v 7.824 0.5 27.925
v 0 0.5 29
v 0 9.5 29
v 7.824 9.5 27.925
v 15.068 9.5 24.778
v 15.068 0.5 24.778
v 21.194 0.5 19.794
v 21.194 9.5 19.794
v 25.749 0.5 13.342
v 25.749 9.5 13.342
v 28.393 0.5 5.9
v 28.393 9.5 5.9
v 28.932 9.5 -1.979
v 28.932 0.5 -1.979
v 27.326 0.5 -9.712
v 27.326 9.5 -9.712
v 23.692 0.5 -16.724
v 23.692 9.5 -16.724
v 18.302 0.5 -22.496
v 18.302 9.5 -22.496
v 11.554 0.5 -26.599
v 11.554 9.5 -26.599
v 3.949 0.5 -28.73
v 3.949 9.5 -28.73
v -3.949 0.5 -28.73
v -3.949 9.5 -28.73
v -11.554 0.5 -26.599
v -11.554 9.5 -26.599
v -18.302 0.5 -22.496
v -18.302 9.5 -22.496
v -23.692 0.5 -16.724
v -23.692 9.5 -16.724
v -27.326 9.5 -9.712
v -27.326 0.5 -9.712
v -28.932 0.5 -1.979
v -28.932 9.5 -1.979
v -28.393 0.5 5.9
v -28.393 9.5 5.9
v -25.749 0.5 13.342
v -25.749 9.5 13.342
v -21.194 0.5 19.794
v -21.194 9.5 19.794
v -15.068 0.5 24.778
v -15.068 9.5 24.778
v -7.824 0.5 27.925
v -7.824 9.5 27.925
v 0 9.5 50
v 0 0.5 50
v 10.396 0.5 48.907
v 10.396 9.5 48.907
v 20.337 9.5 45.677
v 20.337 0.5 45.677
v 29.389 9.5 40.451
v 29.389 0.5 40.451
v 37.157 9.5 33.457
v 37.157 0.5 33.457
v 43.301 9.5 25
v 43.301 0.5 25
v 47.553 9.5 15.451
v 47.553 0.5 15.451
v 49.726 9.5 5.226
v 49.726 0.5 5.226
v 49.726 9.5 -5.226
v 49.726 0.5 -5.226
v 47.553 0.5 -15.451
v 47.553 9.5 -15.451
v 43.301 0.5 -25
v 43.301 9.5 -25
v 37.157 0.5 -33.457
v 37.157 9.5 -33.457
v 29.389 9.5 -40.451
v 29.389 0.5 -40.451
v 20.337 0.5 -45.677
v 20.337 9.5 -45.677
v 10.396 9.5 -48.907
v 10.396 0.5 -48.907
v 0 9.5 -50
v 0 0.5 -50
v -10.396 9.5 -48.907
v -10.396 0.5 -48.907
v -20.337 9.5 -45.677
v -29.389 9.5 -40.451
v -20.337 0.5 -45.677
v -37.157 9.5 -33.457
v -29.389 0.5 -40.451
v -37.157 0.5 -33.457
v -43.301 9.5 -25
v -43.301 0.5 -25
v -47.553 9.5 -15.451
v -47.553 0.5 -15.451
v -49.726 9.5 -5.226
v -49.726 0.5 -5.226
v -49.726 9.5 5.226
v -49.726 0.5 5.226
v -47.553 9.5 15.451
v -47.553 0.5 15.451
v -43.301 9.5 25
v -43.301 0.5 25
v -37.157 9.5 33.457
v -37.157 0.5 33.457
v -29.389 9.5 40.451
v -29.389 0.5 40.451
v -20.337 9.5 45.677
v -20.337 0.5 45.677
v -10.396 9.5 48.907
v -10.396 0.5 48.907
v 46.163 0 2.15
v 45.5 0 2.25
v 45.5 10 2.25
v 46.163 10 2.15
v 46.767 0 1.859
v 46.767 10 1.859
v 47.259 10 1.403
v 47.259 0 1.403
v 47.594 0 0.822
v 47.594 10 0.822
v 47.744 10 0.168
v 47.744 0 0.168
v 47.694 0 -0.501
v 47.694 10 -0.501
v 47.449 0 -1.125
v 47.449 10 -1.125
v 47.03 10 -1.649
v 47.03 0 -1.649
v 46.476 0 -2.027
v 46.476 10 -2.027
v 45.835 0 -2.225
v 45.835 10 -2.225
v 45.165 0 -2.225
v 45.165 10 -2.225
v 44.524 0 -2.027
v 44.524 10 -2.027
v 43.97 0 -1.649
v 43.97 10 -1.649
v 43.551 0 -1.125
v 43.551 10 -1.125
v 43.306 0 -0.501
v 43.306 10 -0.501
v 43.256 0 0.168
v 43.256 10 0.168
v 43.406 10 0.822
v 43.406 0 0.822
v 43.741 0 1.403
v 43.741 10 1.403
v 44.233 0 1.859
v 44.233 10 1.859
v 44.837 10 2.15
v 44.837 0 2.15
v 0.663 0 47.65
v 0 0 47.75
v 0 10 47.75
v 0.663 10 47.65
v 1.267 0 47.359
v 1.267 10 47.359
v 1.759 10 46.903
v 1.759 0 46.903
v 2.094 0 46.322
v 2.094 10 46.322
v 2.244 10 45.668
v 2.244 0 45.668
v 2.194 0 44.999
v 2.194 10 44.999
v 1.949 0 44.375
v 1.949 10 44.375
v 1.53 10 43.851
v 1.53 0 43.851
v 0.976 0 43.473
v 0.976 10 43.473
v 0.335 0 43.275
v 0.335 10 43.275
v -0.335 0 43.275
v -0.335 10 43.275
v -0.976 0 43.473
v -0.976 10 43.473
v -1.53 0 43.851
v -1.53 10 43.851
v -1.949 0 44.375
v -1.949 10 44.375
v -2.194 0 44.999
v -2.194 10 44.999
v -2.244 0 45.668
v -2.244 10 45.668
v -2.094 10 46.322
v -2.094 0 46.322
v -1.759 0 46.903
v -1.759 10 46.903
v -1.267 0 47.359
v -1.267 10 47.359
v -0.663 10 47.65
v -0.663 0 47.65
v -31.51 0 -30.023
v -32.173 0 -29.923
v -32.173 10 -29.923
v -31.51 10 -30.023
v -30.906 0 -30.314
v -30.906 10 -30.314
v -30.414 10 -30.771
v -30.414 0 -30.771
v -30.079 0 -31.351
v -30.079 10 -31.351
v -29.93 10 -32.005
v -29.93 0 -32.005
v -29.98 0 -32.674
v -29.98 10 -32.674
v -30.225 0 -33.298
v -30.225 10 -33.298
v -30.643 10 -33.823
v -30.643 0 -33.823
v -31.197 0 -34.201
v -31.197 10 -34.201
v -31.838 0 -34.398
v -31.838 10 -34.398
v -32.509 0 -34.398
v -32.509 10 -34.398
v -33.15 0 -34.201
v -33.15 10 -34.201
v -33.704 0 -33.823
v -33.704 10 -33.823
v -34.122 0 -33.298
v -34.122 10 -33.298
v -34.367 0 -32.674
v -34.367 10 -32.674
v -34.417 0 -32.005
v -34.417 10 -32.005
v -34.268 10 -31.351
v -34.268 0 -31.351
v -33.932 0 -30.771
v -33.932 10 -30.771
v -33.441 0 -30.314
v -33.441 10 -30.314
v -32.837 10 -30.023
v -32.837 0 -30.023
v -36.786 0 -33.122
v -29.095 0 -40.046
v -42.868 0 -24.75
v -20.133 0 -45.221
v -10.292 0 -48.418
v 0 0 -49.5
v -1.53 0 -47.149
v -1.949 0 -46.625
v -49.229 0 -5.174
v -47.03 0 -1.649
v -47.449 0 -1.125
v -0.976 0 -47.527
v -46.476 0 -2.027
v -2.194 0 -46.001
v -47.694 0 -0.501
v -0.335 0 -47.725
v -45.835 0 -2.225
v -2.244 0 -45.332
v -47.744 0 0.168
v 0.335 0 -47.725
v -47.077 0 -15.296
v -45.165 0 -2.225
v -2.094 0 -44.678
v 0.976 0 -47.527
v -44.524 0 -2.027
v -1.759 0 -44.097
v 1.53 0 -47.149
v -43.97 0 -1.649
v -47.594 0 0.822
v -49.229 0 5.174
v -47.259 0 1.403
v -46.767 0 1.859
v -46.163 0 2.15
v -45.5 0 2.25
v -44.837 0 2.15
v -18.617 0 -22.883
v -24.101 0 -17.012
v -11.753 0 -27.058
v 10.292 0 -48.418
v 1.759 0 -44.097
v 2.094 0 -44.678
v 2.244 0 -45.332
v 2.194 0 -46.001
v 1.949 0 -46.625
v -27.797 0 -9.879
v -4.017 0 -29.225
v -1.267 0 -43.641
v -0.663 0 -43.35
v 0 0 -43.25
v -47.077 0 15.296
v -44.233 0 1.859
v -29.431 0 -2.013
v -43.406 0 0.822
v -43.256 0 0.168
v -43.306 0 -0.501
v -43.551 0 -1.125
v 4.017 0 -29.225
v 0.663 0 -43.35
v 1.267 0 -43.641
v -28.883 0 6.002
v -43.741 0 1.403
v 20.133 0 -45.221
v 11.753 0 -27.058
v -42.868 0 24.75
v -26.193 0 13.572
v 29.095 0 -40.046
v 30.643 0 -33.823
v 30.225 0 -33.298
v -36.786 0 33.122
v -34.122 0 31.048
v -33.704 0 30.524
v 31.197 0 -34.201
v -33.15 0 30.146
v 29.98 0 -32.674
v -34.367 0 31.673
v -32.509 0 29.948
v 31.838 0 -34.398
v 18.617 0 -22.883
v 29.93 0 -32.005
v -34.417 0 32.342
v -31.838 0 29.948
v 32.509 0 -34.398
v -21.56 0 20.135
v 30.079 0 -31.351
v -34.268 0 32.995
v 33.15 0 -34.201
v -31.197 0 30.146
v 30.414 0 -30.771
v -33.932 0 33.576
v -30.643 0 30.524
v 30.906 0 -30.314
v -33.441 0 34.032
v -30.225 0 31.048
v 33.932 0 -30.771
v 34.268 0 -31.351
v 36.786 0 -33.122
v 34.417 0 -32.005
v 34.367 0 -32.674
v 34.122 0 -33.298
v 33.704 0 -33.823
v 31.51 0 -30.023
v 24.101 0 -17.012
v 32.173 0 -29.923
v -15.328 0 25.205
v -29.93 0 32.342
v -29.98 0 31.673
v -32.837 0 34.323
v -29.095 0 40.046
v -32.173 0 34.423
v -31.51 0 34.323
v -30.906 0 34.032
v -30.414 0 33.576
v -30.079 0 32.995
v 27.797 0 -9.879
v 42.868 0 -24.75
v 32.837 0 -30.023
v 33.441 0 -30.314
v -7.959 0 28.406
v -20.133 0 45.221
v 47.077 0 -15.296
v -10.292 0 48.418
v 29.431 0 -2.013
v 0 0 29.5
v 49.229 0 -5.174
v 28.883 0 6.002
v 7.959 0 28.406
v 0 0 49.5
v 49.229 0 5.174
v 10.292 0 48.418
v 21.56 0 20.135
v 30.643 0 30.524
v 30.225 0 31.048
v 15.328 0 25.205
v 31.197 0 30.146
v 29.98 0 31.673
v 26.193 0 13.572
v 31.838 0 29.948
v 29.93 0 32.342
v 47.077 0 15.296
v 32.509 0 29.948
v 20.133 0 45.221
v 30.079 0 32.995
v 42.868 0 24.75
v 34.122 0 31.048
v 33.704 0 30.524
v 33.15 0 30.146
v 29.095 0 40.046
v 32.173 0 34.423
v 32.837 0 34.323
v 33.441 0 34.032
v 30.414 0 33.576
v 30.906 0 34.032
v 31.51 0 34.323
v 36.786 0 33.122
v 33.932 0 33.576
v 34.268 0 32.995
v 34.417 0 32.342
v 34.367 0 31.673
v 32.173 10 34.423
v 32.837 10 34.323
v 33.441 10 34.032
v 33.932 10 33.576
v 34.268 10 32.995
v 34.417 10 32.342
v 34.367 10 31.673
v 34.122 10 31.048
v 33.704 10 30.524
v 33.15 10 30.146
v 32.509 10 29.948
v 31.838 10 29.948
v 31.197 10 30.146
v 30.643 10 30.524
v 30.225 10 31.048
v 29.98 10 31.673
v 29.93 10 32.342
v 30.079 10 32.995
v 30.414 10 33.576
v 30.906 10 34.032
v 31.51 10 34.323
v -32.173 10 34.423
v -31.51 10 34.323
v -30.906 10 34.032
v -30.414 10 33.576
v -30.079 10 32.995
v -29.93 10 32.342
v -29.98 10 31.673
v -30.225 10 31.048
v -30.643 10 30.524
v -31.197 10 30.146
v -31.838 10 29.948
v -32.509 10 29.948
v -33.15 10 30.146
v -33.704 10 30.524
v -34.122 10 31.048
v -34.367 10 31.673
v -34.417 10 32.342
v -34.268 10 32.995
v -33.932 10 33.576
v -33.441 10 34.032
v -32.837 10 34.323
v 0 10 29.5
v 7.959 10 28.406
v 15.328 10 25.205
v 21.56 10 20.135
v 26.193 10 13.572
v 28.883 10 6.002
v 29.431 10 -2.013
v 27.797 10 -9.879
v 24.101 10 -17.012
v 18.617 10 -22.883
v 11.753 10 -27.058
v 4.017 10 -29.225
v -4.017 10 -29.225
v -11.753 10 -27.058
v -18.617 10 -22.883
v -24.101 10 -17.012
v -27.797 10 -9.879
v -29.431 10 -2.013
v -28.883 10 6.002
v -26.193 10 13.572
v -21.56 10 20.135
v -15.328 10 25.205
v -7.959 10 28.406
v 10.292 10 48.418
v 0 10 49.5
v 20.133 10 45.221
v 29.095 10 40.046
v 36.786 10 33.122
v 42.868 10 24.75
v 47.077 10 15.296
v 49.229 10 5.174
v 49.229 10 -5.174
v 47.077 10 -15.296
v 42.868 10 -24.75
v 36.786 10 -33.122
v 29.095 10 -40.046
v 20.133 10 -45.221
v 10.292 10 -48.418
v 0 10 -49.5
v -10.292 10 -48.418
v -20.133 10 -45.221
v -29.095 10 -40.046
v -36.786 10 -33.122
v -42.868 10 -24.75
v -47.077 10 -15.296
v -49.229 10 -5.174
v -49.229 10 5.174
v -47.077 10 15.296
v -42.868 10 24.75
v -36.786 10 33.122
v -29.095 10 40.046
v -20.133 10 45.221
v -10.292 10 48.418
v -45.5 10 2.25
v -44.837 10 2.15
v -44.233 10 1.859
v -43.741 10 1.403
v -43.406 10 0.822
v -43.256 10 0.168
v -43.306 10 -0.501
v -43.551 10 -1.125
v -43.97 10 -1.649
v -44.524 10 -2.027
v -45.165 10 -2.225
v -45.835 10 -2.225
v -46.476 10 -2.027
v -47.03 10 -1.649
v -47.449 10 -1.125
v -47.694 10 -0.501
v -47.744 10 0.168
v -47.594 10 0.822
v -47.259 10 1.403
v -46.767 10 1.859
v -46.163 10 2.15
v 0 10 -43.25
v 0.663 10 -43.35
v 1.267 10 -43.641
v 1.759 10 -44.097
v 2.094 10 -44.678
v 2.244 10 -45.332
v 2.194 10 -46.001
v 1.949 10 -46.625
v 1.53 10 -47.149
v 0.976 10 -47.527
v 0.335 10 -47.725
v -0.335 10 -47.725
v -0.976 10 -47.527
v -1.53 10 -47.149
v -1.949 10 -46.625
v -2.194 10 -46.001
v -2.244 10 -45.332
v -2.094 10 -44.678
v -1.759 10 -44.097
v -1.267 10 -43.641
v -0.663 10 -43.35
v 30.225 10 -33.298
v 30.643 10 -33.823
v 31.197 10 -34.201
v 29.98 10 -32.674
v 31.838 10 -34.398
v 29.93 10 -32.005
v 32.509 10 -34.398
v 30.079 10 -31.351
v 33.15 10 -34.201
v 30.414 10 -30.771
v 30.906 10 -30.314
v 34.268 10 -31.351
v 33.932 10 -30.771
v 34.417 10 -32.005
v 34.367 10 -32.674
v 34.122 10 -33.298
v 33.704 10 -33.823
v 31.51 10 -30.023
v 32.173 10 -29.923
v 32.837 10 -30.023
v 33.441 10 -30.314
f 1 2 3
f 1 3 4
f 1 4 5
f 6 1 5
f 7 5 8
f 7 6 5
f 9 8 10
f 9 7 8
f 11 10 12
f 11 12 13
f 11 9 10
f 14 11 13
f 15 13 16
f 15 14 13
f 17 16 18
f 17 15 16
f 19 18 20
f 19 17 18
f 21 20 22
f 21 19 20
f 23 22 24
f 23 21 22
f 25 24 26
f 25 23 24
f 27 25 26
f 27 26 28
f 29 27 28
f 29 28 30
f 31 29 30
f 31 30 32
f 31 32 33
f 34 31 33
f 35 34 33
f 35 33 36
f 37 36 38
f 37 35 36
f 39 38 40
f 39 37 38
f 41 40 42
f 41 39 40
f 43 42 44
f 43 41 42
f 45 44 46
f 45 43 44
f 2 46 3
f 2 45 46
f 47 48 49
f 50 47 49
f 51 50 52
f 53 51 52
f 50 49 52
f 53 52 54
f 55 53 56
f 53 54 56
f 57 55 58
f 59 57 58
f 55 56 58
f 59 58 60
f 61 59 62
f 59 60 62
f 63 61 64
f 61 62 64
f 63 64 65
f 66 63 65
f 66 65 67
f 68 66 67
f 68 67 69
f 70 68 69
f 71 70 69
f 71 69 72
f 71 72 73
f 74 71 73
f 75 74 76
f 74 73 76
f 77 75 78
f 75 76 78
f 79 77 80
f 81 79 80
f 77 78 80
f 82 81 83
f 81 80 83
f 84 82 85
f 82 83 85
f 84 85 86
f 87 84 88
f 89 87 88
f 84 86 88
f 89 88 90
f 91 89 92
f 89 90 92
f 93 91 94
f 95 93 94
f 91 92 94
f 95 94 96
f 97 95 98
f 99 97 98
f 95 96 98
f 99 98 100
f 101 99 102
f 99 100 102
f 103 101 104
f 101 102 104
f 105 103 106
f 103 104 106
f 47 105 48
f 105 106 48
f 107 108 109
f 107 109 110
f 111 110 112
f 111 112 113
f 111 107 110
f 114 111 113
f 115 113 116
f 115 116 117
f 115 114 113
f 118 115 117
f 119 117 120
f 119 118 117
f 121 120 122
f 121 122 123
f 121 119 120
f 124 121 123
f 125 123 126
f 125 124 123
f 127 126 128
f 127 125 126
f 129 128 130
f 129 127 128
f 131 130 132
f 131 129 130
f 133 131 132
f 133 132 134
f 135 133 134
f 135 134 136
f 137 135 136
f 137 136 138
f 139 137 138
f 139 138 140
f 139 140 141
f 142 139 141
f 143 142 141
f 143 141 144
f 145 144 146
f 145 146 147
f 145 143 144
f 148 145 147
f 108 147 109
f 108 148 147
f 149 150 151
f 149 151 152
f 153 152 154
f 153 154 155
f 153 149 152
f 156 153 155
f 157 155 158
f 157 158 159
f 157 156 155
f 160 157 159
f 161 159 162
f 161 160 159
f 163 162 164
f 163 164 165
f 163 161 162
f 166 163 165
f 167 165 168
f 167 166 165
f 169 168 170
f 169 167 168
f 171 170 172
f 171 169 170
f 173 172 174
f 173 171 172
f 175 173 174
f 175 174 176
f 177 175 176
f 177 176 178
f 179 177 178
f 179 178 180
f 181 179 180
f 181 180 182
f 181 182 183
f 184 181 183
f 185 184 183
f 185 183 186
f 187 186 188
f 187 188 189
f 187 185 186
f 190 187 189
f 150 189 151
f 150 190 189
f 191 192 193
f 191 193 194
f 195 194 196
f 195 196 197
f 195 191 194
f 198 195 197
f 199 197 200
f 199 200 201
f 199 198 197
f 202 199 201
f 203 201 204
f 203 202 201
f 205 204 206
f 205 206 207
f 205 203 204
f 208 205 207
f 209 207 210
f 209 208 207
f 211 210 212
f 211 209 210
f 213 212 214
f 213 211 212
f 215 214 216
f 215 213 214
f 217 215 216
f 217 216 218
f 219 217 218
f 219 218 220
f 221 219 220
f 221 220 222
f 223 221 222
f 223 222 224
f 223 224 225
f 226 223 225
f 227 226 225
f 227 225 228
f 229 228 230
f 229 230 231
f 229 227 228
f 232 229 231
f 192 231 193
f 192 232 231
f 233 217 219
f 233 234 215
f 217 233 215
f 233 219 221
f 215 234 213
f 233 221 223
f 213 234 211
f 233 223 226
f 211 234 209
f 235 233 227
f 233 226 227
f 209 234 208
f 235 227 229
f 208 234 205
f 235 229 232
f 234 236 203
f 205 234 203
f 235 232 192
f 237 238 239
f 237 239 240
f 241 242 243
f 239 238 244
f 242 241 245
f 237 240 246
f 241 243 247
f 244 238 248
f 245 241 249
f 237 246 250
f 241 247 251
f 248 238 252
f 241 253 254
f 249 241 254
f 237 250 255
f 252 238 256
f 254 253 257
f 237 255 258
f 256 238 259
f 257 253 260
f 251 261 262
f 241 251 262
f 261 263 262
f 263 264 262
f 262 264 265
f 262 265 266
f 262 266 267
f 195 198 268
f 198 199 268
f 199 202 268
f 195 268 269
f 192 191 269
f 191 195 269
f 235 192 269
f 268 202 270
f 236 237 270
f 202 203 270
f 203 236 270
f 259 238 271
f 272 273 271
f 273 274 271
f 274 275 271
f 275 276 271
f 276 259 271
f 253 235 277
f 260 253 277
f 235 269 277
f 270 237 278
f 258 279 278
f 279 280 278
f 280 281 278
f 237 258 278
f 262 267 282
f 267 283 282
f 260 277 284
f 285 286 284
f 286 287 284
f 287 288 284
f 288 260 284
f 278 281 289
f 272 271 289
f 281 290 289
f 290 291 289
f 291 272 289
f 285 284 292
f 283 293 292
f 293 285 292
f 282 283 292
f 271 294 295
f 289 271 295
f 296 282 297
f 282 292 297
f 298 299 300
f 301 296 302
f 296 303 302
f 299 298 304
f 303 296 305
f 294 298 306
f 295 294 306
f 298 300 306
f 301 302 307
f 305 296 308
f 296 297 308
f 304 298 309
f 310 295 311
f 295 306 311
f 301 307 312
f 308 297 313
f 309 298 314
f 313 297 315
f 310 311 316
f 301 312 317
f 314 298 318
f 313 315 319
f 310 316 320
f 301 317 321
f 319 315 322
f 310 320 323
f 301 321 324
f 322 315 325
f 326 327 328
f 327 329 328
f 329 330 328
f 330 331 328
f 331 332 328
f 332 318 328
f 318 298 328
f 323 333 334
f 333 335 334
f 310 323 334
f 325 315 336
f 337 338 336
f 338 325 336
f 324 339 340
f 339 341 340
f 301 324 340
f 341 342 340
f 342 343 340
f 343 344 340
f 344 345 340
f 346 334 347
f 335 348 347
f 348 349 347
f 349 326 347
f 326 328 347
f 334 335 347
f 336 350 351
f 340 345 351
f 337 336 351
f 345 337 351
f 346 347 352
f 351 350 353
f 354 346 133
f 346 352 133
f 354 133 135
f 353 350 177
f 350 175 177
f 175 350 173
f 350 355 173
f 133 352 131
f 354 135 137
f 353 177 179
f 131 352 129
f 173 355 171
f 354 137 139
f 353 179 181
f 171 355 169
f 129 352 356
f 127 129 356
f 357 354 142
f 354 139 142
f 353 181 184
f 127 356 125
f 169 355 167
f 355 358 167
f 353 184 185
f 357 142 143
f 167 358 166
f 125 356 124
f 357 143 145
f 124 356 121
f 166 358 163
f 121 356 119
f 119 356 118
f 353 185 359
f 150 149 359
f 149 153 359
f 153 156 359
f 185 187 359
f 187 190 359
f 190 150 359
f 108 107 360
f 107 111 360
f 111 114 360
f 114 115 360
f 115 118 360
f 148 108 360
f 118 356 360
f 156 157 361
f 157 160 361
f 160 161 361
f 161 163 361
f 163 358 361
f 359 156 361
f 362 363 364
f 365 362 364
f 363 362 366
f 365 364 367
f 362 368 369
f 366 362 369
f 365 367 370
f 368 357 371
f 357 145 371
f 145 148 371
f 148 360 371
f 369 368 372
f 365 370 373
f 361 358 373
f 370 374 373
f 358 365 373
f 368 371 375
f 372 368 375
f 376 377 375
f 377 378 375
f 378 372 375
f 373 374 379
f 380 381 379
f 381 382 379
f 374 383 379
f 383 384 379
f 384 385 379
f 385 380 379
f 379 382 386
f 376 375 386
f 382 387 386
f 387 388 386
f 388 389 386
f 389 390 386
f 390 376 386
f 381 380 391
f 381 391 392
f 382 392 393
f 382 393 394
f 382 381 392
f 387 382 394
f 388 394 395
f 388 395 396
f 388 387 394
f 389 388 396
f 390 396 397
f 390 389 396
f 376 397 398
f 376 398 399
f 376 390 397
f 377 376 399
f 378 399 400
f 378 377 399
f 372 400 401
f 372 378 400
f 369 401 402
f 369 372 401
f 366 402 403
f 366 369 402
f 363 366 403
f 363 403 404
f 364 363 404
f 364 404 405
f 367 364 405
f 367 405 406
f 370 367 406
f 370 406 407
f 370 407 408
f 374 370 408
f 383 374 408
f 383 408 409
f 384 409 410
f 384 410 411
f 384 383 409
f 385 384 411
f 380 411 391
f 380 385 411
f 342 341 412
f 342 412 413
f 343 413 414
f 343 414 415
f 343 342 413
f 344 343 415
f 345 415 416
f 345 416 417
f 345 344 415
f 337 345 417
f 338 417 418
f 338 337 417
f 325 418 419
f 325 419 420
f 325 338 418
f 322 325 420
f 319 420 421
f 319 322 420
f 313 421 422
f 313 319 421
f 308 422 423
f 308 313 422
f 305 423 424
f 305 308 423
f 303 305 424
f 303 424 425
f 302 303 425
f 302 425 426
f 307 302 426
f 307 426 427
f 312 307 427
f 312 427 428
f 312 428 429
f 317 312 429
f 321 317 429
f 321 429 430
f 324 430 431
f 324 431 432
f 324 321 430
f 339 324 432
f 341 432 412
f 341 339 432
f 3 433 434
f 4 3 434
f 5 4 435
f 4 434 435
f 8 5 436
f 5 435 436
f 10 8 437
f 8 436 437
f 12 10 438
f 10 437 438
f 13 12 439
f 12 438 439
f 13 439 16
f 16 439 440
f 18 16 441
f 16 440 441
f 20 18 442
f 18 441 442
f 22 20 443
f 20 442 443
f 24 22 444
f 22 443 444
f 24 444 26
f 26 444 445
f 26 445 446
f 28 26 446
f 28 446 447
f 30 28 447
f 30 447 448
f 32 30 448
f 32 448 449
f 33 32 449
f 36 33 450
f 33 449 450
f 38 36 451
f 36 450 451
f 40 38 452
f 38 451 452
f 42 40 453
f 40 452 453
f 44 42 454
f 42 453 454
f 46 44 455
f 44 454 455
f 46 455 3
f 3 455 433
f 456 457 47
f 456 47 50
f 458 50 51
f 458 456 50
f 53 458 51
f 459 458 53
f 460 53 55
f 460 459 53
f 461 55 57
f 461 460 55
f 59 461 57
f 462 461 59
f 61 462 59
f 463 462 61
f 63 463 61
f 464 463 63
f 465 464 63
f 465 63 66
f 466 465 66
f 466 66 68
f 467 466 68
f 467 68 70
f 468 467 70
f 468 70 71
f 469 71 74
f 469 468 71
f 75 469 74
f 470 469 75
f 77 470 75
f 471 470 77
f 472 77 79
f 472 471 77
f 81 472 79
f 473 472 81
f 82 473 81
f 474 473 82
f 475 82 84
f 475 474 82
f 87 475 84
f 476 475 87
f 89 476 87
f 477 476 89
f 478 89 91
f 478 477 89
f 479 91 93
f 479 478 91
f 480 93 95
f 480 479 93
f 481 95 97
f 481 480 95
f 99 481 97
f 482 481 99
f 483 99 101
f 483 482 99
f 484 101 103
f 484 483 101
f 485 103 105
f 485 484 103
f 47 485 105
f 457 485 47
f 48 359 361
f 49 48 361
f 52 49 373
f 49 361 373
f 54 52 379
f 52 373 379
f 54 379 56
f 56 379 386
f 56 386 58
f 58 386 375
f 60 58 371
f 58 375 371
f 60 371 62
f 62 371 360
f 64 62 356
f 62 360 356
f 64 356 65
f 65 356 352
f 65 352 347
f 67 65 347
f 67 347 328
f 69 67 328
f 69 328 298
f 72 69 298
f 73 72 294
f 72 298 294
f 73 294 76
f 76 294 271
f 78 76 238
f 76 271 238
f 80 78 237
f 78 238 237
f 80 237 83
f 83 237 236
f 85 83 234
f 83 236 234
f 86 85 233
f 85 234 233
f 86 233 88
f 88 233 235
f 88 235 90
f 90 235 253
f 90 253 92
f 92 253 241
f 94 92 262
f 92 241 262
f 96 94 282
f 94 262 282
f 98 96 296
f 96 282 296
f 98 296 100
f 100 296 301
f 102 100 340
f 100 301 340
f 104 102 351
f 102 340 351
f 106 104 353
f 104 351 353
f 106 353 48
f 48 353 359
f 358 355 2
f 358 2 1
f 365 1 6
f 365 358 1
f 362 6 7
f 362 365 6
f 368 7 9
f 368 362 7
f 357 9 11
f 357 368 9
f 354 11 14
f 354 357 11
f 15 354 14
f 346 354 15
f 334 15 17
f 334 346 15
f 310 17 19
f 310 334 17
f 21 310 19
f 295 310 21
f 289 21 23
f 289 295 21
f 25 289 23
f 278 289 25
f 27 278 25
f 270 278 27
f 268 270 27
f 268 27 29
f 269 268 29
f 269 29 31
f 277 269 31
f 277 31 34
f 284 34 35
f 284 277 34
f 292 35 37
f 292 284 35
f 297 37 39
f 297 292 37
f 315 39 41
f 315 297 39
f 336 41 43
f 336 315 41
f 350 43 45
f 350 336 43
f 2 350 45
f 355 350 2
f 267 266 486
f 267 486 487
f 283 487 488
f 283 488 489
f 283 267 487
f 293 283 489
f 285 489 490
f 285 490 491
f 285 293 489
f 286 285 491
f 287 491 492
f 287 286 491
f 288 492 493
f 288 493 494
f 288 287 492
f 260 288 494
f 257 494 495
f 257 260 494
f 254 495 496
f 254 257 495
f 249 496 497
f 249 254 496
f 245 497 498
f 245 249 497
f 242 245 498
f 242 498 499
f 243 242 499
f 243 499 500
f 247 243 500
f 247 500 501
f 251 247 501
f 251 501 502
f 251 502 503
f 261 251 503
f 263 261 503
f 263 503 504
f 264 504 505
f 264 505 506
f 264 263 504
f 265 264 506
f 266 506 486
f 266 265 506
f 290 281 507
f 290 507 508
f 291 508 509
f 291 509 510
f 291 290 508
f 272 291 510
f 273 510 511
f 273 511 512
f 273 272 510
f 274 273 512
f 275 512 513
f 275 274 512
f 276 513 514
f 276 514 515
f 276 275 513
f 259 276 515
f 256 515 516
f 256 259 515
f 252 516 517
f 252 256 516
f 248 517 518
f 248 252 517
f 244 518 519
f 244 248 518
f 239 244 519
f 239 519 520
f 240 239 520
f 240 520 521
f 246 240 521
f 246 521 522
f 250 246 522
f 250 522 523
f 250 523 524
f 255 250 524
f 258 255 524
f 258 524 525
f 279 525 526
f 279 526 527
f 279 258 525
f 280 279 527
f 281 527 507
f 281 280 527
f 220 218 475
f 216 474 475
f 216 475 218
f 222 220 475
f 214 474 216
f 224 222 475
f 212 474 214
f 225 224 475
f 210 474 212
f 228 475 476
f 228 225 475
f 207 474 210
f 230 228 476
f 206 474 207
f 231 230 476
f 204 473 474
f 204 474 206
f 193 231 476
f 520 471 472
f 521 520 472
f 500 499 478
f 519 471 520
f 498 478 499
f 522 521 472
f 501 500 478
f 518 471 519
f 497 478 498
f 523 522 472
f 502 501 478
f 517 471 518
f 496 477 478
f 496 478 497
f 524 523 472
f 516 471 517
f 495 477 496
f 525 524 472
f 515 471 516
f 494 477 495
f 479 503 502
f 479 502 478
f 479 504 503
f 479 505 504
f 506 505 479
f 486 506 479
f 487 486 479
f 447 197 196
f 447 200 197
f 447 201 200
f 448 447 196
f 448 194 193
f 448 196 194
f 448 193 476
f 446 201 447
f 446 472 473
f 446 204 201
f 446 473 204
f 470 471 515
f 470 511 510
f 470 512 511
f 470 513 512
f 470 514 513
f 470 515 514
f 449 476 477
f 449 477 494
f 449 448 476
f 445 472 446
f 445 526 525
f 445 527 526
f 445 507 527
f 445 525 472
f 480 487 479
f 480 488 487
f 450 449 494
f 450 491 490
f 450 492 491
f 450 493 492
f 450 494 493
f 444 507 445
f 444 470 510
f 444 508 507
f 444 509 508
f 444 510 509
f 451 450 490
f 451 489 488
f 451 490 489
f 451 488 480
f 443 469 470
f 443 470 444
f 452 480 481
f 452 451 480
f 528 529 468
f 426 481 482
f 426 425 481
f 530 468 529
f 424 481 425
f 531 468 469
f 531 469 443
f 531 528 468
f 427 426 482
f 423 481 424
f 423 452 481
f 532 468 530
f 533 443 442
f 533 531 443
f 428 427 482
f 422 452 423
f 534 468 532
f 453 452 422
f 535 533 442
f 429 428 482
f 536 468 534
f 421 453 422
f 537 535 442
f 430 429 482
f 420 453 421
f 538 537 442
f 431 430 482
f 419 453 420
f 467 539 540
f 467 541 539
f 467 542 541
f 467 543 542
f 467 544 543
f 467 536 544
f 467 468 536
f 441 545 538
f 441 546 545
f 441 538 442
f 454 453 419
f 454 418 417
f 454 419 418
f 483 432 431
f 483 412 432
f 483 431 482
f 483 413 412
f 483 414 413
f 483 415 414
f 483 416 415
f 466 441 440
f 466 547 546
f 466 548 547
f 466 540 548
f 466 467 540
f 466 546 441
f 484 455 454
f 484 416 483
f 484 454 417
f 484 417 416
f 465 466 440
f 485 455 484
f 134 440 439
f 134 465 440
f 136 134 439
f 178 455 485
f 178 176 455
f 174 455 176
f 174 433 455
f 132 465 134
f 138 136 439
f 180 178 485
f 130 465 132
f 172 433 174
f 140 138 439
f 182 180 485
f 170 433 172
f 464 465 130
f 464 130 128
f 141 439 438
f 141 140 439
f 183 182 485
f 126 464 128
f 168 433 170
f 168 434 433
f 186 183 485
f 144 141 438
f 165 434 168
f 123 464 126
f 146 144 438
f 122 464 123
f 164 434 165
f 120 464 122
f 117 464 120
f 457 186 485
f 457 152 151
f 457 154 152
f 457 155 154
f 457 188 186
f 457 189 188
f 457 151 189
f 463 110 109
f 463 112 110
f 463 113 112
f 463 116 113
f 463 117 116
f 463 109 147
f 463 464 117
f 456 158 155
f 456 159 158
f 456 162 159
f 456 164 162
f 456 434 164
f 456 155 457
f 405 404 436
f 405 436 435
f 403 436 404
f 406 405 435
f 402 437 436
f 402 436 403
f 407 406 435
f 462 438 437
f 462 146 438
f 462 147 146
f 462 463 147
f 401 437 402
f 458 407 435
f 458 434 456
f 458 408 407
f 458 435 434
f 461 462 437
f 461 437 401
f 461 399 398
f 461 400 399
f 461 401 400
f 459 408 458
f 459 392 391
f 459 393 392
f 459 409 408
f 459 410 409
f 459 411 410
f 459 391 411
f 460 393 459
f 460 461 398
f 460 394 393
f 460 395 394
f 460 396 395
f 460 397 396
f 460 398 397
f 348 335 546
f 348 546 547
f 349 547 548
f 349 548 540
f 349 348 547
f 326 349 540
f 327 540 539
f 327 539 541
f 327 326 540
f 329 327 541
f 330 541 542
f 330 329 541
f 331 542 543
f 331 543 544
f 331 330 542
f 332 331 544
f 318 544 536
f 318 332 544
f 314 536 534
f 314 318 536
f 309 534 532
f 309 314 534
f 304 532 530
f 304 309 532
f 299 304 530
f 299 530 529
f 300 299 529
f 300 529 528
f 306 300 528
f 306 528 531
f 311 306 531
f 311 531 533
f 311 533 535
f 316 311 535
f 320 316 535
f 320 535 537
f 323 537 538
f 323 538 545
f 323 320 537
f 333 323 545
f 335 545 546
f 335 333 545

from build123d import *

# Parameters (mm, degrees)
SKETCH1_R           = 50
SKETCH1_R_2         = 2.25
SKETCH1_R_3         = 29
BOSS_EXTRUDE1_DEPTH = 10
CHAMFER1_SIZE       = 0.5


with BuildPart() as part:
    # Sketch1 → Boss-Extrude1 (new body)
    with BuildSketch(Plane(origin=(0, 0, 0), x_dir=(1, 0, 0), z_dir=(0, 1, 0))):
        Circle(SKETCH1_R)
        with Locations((0, 45.5)):
            Circle(SKETCH1_R_2, mode=Mode.SUBTRACT)
        with Locations((32.173358544, 32.173358544)):
            Circle(SKETCH1_R_2, mode=Mode.SUBTRACT)
        with Locations((45.5, 0)):
            Circle(SKETCH1_R_2, mode=Mode.SUBTRACT)
        with Locations((32.173358544, -32.173358544)):
            Circle(SKETCH1_R_2, mode=Mode.SUBTRACT)
        with Locations((0, -45.5)):
            Circle(SKETCH1_R_2, mode=Mode.SUBTRACT)
        with Locations((-32.173358544, -32.173358544)):
            Circle(SKETCH1_R_2, mode=Mode.SUBTRACT)
        with Locations((-45.5, 0)):
            Circle(SKETCH1_R_2, mode=Mode.SUBTRACT)
        with Locations((-32.173358544, 32.173358544)):
            Circle(SKETCH1_R_2, mode=Mode.SUBTRACT)
        Circle(SKETCH1_R_3, mode=Mode.SUBTRACT)
    extrude(amount=BOSS_EXTRUDE1_DEPTH)

    # Chamfer1
    chamfer1_edges = [part.edges().sort_by_distance(p)[0] for p in [
        (-29, 10, 0),
        (-29, 0, 0),
        (-50, 10, 0),
        (-50, 0, 0),
    ]]
    chamfer(chamfer1_edges, length=CHAMFER1_SIZE)


solid = part.part
